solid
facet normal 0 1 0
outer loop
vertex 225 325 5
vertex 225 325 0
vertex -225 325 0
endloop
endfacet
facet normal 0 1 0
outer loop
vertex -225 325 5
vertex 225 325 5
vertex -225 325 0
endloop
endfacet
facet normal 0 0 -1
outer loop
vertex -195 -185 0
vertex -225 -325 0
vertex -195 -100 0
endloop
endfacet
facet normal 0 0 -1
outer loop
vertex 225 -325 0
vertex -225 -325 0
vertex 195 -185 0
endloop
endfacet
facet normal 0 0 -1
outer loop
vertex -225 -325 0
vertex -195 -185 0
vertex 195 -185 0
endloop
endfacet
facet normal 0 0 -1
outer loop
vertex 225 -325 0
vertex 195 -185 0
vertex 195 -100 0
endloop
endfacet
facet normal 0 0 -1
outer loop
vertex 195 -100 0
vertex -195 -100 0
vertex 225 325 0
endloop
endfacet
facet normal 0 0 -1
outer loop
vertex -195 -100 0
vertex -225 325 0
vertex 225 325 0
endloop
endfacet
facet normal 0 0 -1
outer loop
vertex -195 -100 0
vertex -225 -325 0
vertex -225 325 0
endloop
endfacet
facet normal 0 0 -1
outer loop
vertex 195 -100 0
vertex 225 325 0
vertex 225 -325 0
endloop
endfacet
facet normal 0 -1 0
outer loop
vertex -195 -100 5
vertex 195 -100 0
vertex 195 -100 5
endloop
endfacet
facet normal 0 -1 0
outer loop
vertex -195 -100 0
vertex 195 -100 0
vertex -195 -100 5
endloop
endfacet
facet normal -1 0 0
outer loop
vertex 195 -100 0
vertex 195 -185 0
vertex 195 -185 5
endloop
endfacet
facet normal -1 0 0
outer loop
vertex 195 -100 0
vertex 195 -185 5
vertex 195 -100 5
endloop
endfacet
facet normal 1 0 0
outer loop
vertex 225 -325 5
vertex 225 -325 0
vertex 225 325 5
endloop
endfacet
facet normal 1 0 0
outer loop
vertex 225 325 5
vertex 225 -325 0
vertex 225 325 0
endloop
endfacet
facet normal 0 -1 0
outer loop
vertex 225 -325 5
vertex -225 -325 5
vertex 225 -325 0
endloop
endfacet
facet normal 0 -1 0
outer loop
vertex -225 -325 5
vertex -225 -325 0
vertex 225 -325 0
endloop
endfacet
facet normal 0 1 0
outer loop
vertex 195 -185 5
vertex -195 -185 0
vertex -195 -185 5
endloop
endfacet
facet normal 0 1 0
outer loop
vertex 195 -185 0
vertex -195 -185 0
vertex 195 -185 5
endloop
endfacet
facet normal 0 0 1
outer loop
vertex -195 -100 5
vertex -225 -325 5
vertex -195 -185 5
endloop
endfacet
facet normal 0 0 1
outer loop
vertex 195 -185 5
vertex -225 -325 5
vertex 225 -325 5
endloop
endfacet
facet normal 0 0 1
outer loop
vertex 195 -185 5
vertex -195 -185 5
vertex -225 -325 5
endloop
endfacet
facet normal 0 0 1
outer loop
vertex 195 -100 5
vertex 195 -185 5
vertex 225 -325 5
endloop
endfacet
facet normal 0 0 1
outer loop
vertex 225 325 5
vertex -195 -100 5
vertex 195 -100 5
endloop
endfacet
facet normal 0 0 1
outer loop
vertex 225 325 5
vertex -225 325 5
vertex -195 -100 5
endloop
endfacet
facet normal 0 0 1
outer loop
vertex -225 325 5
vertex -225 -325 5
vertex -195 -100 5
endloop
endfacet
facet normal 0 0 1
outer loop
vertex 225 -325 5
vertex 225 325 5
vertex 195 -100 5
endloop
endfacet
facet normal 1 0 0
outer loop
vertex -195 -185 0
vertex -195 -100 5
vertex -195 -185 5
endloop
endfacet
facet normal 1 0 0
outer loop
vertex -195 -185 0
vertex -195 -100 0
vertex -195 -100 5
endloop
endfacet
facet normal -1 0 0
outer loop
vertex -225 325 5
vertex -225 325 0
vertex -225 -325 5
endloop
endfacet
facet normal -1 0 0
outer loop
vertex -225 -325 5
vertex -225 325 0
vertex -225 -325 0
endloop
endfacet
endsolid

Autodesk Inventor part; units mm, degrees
ref_plane "YZ Plane" through (0, 0, 0) normal (1, 0, 0) x (0, 1, 0)
ref_plane "XZ Plane" through (0, 0, 0) normal (0, 1, 0) x (-1, 0, 0)
ref_plane "XY Plane" through (0, 0, 0) normal (0, 0, 1) x (1, 0, 0)
sketch "Sketch1" plane through (0, 0, 0) normal (0, 0, 1) x (1, 0, 0)
  line L0 (-225, -325) -> (225, -325)
  line L1 (225, -325) -> (225, 325)
  line L2 (225, 325) -> (-225, 325)
  line L3 (-225, 325) -> (-225, -325)
  line L4 (-225, -325) -> (225, 325) construction
  line L5 (225, -325) -> (-225, 325) construction
  line L6 (-195, -185) -> (195, -185)
  line L7 (195, -185) -> (195, -100)
  line L8 (195, -100) -> (-195, -100)
  line L9 (-195, -100) -> (-195, -185)
  line L10 (-195, -185) -> (195, -100) construction
  line L11 (195, -185) -> (-195, -100) construction
  point P0 (0, 0)
  point P1 (0, -142.5)
  dimension "d0" = 450
  dimension "d1" = 650
  dimension "d4" = 140
  dimension "d5" = 225
  dimension "d6" = 390
extrude "Extrusion1" add sketch "Sketch1" along normal blind 5
properties part number "Foam Sheet Front" material "PVC-Piping"
